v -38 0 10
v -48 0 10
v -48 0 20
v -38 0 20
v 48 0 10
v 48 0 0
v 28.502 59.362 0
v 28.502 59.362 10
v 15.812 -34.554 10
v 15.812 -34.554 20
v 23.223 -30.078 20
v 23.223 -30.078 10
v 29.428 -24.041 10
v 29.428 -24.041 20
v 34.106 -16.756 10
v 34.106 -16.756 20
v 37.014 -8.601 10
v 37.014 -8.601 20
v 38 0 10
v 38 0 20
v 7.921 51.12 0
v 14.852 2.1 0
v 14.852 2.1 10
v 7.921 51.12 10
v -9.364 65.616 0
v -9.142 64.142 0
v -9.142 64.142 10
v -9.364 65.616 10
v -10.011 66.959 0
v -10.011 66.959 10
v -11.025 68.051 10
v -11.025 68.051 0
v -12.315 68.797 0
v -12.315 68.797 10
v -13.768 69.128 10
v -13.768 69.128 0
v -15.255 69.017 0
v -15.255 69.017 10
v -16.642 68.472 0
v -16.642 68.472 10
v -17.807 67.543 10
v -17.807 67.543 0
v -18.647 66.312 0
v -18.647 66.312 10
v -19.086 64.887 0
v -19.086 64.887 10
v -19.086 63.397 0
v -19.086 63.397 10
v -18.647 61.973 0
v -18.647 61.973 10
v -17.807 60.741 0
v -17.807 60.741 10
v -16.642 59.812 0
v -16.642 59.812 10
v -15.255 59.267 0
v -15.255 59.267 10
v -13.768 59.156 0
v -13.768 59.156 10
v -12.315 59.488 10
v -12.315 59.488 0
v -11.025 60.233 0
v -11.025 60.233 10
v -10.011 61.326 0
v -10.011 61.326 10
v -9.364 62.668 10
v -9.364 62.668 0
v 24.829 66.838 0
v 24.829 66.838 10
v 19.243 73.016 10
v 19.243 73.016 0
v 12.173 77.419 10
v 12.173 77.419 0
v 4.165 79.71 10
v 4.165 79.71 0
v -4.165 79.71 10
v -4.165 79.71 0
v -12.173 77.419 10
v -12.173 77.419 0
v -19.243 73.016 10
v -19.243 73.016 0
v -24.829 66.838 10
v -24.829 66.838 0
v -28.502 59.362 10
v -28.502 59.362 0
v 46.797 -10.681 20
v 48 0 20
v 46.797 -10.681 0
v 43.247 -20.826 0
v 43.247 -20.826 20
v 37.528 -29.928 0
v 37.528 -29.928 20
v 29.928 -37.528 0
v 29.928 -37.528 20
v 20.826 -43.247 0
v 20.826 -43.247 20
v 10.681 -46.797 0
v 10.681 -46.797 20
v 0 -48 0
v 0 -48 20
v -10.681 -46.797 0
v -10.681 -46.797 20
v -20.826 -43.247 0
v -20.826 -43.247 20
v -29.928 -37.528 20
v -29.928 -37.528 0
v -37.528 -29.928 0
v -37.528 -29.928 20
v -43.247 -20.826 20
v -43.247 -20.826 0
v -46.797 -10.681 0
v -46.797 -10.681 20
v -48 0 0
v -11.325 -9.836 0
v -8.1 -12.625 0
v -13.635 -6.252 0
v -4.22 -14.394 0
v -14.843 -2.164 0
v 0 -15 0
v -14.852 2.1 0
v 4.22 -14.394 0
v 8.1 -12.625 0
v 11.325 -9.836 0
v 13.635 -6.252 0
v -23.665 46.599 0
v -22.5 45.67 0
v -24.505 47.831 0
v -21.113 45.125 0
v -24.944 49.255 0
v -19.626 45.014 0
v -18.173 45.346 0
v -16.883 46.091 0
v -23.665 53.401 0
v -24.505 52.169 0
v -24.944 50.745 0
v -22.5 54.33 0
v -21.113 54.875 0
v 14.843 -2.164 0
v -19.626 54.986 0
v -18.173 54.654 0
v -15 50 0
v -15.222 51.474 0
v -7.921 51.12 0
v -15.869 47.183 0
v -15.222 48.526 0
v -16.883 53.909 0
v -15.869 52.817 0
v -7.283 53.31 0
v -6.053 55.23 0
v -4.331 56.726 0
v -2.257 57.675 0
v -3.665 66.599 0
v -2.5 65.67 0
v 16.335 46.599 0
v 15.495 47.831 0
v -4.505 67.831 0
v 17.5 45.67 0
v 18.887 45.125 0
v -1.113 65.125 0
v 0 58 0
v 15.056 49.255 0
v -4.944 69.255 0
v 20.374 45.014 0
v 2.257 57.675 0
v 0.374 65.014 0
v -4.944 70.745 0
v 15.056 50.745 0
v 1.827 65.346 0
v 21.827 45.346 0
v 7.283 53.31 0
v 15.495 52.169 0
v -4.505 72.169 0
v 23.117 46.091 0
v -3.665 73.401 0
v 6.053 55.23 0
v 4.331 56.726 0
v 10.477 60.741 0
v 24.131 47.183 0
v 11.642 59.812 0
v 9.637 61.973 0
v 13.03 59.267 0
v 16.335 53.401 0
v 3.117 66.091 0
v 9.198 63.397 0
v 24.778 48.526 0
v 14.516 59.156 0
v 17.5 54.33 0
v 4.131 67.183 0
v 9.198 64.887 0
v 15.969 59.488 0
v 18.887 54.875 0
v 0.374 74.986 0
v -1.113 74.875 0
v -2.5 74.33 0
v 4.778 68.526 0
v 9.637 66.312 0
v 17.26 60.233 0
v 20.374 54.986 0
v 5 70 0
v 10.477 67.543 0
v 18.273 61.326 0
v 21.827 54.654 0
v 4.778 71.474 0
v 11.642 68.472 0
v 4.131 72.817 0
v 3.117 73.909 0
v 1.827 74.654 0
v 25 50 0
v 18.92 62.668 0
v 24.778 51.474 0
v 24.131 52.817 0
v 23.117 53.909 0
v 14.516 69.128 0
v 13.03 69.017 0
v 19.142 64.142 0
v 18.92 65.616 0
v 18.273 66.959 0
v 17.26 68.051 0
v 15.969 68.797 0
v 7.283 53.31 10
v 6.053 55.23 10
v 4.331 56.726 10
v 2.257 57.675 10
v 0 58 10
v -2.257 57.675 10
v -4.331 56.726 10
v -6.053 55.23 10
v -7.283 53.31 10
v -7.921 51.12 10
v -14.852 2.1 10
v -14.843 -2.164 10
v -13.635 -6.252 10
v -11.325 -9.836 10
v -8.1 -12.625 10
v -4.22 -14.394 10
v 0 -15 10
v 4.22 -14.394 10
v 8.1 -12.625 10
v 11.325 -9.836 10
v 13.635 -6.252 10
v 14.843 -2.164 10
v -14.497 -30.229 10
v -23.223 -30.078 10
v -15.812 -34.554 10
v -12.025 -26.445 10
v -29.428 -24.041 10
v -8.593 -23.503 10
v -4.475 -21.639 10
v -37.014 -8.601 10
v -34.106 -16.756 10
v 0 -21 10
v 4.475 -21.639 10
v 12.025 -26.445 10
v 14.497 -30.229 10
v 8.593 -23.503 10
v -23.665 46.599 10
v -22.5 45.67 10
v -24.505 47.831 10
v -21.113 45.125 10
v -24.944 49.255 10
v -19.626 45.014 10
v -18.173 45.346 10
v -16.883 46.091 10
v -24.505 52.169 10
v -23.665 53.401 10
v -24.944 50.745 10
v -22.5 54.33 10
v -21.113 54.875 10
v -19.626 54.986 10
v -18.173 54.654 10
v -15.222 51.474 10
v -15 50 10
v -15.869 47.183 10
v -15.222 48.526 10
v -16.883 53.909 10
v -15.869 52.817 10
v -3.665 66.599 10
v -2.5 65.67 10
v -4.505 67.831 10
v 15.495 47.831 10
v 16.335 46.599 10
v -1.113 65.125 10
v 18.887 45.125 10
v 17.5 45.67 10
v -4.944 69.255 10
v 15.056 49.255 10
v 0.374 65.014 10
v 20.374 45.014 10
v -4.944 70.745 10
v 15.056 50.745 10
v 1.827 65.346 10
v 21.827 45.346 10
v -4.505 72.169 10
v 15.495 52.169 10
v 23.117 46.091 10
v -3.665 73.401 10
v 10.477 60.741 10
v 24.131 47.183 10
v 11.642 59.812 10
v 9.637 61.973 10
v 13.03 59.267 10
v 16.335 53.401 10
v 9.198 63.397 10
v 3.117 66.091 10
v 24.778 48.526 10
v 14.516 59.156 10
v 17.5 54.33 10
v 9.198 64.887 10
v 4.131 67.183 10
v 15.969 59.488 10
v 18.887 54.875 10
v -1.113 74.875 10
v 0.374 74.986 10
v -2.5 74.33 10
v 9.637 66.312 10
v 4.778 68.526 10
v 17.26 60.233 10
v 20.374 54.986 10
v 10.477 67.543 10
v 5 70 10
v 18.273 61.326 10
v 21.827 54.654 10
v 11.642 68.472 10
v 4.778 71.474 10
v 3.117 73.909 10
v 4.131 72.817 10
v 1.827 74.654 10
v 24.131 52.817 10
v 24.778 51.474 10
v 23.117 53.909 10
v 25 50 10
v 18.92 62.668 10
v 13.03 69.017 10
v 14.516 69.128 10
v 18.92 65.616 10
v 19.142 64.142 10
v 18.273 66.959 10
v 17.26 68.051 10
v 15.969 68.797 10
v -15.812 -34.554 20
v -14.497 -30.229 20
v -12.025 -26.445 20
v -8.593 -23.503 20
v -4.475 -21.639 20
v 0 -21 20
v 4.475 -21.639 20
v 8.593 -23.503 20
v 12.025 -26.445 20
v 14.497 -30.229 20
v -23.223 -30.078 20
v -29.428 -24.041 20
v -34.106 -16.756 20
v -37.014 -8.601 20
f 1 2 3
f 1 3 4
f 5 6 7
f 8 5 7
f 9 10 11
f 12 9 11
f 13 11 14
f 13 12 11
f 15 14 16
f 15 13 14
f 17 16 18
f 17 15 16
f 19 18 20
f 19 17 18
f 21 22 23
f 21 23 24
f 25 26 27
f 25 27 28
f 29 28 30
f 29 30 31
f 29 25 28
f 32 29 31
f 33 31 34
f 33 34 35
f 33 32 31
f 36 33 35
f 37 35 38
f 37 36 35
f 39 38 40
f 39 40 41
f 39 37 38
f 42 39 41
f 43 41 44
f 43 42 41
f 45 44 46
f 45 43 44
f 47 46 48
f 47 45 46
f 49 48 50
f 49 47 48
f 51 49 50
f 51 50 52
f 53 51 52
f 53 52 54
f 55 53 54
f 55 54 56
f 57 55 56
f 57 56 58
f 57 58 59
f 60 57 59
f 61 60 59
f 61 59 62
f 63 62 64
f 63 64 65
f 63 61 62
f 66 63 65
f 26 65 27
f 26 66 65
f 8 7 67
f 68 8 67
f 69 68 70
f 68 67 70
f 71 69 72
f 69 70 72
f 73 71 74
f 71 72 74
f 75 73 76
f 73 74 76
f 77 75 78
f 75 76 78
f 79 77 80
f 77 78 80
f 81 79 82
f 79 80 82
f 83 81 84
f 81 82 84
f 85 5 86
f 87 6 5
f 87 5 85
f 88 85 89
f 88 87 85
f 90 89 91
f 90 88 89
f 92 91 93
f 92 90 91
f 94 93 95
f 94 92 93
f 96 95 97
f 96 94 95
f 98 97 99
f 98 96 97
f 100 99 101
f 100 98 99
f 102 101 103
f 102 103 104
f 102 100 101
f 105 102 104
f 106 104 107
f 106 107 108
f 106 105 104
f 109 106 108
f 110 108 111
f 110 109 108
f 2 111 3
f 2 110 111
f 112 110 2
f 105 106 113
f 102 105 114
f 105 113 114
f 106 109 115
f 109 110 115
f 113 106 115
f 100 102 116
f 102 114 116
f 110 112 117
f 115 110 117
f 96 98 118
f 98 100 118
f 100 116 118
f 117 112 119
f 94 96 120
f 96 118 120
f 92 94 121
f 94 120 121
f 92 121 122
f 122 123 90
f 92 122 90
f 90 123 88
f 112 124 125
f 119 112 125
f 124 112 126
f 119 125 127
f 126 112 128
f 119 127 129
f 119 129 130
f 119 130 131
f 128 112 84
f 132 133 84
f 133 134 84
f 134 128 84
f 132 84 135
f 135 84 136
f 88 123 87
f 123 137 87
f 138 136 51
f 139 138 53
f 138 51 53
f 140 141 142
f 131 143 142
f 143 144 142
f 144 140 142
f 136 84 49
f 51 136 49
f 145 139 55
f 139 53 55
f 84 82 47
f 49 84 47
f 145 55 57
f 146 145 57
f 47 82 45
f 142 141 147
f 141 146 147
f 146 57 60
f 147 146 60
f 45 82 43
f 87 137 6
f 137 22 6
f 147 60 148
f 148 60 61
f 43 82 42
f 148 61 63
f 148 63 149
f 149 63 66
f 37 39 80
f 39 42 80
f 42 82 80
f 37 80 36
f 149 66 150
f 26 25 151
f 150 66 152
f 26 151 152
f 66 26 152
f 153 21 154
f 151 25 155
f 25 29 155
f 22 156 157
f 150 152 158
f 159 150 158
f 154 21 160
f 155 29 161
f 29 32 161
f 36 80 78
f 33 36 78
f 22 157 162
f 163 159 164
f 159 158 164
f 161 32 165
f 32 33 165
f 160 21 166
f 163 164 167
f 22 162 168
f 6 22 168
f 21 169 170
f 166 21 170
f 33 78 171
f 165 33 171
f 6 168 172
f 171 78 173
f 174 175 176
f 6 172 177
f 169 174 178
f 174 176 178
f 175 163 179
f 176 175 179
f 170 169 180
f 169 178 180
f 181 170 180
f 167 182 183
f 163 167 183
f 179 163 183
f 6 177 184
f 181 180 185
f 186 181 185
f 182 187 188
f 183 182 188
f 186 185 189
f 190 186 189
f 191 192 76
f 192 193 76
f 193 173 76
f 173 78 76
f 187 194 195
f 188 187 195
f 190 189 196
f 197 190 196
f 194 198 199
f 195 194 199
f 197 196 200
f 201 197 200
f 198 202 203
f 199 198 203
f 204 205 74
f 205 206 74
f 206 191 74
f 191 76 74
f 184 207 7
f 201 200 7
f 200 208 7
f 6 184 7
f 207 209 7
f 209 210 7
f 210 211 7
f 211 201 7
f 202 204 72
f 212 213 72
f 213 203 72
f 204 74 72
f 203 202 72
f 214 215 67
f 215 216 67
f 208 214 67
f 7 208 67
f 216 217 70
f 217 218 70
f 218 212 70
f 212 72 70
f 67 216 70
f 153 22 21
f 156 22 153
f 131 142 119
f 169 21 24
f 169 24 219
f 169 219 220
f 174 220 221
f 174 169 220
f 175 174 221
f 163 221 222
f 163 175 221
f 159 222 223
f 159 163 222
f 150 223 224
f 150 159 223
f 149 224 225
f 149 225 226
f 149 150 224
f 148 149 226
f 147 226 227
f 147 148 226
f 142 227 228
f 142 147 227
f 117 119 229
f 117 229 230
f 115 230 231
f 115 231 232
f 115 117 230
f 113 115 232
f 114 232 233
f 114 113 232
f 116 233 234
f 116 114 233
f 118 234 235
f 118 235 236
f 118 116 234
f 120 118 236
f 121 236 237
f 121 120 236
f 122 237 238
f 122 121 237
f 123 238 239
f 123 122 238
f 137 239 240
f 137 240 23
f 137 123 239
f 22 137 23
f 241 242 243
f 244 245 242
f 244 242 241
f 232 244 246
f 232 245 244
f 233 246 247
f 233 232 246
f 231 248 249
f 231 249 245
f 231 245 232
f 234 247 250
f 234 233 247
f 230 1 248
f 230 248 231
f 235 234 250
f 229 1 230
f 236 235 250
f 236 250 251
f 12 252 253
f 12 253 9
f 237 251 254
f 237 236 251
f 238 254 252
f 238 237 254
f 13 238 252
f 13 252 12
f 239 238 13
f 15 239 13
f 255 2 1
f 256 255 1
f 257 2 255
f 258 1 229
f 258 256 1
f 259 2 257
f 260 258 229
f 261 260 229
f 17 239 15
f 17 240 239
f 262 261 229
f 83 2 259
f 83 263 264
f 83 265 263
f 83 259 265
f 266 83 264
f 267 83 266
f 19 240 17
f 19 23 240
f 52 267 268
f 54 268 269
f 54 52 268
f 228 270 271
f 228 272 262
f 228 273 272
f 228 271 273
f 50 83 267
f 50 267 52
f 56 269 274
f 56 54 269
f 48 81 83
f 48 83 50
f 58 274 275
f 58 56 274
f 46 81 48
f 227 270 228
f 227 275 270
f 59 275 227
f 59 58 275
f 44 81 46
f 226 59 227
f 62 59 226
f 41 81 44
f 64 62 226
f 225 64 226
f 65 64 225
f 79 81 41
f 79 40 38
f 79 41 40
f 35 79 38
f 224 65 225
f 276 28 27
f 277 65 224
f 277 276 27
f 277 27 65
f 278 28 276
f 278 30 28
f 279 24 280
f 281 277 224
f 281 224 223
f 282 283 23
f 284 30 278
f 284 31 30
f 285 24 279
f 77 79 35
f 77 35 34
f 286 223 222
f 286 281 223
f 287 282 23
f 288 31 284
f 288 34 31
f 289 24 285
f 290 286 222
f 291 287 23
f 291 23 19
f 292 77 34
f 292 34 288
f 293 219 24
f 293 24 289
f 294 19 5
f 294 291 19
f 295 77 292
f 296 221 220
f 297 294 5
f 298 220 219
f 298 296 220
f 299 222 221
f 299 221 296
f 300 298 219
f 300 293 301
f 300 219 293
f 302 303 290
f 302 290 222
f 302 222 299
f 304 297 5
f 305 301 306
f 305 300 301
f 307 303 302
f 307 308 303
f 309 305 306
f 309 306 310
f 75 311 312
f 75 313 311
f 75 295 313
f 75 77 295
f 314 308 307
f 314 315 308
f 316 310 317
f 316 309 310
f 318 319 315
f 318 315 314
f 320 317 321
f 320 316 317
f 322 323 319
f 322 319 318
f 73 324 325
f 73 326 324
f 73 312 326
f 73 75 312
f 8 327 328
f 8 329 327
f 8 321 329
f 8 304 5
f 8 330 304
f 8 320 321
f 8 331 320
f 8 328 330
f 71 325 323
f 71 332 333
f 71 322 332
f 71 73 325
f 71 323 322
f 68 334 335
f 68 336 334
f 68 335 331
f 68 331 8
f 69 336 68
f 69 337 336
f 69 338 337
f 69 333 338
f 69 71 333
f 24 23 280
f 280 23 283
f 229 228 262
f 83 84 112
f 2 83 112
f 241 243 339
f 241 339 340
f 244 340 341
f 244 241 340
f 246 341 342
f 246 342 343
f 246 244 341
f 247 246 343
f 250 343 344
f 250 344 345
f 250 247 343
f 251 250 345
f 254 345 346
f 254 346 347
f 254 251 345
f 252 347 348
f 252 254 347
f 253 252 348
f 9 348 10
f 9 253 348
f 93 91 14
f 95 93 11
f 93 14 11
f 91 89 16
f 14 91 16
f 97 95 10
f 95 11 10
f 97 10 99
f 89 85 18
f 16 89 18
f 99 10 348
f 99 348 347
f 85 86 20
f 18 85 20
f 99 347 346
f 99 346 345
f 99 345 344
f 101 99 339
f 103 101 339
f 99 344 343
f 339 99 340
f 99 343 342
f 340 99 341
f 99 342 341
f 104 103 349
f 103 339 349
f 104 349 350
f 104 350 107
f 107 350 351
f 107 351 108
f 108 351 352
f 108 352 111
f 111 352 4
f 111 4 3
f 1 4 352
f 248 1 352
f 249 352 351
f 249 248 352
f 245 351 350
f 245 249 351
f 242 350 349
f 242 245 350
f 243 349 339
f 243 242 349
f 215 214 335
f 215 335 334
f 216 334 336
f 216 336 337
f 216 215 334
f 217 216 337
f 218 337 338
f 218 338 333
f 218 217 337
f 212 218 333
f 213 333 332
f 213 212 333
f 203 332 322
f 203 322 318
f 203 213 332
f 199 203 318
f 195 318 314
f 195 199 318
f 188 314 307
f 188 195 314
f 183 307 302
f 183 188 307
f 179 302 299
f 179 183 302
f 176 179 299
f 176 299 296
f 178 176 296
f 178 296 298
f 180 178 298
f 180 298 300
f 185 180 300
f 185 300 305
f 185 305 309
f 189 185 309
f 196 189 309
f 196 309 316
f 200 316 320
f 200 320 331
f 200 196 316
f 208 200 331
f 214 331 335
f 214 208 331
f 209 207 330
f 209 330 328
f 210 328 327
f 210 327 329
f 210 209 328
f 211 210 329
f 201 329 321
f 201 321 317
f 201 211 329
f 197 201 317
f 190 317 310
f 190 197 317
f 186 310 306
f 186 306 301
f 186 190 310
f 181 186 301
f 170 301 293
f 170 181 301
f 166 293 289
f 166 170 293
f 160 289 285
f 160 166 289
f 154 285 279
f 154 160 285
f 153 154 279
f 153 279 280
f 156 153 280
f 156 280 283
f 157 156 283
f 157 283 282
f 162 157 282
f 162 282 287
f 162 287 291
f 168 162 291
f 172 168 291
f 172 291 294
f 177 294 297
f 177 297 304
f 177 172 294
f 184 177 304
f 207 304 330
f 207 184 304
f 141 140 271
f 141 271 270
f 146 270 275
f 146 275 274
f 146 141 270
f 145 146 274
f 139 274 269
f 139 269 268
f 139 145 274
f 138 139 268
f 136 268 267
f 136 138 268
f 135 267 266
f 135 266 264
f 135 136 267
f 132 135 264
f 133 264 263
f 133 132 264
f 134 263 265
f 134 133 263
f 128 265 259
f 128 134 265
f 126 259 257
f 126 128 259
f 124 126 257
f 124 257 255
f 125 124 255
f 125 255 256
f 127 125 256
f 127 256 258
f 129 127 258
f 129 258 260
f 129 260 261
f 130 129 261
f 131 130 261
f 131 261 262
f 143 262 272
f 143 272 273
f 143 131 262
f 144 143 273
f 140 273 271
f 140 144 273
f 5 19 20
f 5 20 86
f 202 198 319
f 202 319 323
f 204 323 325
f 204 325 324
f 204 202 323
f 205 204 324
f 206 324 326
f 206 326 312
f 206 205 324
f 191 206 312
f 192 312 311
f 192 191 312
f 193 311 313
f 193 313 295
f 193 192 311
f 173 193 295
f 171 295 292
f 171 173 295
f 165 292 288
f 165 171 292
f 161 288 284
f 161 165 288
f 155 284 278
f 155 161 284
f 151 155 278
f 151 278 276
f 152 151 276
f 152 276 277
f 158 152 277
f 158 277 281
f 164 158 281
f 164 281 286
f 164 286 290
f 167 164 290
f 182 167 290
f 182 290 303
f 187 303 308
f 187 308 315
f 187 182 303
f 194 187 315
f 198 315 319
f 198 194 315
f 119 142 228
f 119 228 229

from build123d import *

# Parameters (mm, degrees)
SKETCH1_R           = 5
BOSS_EXTRUDE1_DEPTH = 10
BOSS_EXTRUDE2_DEPTH = 20


with BuildPart() as part:
    # Sketch1 → Boss-Extrude1 (new body)
    with BuildSketch(Plane.XY):
        with BuildLine():
            Line((38, 0), (48, 0))
            Line((48, 0), (28.501872629, 59.361797724))
            ThreePointArc((28.501872629, 59.361797724), (0, 80), (-28.501872629, 59.361797724))
            Line((-28.501872629, 59.361797724), (-48, 0))
            Line((-48, 0), (-38, 0))
            ThreePointArc((-38, 0), (-31.975409318, -20.532247781), (-15.811936897, -34.554054054))
            ThreePointArc((-15.811936897, -34.554054054), (0, -21), (15.811936897, -34.554054054))
            ThreePointArc((15.811936897, -34.554054054), (31.975409318, -20.532247781), (38, 0))
        make_face()
        with Locations((-20, 50)):
            Circle(SKETCH1_R, mode=Mode.SUBTRACT)
        with Locations((-14.142135624, 64.142135624)):
            Circle(SKETCH1_R, mode=Mode.SUBTRACT)
        with BuildLine():
            Line((7.921212028, 51.12), (14.852272553, 2.1))
            ThreePointArc((14.852272553, 2.1), (0, -15), (-14.852272553, 2.1))
            Line((-14.852272553, 2.1), (-7.921212028, 51.12))
            ThreePointArc((-7.921212028, 51.12), (0, 58), (7.921212028, 51.12))
        make_face(mode=Mode.SUBTRACT)
        with Locations((20, 50)):
            Circle(SKETCH1_R, mode=Mode.SUBTRACT)
        with Locations((0, 70)):
            Circle(SKETCH1_R, mode=Mode.SUBTRACT)
        with Locations((14.142135624, 64.142135624)):
            Circle(SKETCH1_R, mode=Mode.SUBTRACT)
    extrude(amount=BOSS_EXTRUDE1_DEPTH)

    # Sketch1<3> → Boss-Extrude2 (add)
    with BuildSketch(Plane.XY):
        with BuildLine():
            ThreePointArc((-48, 0), (0, -48), (48, 0))
            Line((48, 0), (38, 0))
            ThreePointArc((38, 0), (31.975409318, -20.532247781), (15.811936897, -34.554054054))
            ThreePointArc((15.811936897, -34.554054054), (0, -21), (-15.811936897, -34.554054054))
            ThreePointArc((-15.811936897, -34.554054054), (-31.975409318, -20.532247781), (-38, 0))
            Line((-38, 0), (-48, 0))
        make_face()
    extrude(amount=BOSS_EXTRUDE2_DEPTH)


solid = part.part
